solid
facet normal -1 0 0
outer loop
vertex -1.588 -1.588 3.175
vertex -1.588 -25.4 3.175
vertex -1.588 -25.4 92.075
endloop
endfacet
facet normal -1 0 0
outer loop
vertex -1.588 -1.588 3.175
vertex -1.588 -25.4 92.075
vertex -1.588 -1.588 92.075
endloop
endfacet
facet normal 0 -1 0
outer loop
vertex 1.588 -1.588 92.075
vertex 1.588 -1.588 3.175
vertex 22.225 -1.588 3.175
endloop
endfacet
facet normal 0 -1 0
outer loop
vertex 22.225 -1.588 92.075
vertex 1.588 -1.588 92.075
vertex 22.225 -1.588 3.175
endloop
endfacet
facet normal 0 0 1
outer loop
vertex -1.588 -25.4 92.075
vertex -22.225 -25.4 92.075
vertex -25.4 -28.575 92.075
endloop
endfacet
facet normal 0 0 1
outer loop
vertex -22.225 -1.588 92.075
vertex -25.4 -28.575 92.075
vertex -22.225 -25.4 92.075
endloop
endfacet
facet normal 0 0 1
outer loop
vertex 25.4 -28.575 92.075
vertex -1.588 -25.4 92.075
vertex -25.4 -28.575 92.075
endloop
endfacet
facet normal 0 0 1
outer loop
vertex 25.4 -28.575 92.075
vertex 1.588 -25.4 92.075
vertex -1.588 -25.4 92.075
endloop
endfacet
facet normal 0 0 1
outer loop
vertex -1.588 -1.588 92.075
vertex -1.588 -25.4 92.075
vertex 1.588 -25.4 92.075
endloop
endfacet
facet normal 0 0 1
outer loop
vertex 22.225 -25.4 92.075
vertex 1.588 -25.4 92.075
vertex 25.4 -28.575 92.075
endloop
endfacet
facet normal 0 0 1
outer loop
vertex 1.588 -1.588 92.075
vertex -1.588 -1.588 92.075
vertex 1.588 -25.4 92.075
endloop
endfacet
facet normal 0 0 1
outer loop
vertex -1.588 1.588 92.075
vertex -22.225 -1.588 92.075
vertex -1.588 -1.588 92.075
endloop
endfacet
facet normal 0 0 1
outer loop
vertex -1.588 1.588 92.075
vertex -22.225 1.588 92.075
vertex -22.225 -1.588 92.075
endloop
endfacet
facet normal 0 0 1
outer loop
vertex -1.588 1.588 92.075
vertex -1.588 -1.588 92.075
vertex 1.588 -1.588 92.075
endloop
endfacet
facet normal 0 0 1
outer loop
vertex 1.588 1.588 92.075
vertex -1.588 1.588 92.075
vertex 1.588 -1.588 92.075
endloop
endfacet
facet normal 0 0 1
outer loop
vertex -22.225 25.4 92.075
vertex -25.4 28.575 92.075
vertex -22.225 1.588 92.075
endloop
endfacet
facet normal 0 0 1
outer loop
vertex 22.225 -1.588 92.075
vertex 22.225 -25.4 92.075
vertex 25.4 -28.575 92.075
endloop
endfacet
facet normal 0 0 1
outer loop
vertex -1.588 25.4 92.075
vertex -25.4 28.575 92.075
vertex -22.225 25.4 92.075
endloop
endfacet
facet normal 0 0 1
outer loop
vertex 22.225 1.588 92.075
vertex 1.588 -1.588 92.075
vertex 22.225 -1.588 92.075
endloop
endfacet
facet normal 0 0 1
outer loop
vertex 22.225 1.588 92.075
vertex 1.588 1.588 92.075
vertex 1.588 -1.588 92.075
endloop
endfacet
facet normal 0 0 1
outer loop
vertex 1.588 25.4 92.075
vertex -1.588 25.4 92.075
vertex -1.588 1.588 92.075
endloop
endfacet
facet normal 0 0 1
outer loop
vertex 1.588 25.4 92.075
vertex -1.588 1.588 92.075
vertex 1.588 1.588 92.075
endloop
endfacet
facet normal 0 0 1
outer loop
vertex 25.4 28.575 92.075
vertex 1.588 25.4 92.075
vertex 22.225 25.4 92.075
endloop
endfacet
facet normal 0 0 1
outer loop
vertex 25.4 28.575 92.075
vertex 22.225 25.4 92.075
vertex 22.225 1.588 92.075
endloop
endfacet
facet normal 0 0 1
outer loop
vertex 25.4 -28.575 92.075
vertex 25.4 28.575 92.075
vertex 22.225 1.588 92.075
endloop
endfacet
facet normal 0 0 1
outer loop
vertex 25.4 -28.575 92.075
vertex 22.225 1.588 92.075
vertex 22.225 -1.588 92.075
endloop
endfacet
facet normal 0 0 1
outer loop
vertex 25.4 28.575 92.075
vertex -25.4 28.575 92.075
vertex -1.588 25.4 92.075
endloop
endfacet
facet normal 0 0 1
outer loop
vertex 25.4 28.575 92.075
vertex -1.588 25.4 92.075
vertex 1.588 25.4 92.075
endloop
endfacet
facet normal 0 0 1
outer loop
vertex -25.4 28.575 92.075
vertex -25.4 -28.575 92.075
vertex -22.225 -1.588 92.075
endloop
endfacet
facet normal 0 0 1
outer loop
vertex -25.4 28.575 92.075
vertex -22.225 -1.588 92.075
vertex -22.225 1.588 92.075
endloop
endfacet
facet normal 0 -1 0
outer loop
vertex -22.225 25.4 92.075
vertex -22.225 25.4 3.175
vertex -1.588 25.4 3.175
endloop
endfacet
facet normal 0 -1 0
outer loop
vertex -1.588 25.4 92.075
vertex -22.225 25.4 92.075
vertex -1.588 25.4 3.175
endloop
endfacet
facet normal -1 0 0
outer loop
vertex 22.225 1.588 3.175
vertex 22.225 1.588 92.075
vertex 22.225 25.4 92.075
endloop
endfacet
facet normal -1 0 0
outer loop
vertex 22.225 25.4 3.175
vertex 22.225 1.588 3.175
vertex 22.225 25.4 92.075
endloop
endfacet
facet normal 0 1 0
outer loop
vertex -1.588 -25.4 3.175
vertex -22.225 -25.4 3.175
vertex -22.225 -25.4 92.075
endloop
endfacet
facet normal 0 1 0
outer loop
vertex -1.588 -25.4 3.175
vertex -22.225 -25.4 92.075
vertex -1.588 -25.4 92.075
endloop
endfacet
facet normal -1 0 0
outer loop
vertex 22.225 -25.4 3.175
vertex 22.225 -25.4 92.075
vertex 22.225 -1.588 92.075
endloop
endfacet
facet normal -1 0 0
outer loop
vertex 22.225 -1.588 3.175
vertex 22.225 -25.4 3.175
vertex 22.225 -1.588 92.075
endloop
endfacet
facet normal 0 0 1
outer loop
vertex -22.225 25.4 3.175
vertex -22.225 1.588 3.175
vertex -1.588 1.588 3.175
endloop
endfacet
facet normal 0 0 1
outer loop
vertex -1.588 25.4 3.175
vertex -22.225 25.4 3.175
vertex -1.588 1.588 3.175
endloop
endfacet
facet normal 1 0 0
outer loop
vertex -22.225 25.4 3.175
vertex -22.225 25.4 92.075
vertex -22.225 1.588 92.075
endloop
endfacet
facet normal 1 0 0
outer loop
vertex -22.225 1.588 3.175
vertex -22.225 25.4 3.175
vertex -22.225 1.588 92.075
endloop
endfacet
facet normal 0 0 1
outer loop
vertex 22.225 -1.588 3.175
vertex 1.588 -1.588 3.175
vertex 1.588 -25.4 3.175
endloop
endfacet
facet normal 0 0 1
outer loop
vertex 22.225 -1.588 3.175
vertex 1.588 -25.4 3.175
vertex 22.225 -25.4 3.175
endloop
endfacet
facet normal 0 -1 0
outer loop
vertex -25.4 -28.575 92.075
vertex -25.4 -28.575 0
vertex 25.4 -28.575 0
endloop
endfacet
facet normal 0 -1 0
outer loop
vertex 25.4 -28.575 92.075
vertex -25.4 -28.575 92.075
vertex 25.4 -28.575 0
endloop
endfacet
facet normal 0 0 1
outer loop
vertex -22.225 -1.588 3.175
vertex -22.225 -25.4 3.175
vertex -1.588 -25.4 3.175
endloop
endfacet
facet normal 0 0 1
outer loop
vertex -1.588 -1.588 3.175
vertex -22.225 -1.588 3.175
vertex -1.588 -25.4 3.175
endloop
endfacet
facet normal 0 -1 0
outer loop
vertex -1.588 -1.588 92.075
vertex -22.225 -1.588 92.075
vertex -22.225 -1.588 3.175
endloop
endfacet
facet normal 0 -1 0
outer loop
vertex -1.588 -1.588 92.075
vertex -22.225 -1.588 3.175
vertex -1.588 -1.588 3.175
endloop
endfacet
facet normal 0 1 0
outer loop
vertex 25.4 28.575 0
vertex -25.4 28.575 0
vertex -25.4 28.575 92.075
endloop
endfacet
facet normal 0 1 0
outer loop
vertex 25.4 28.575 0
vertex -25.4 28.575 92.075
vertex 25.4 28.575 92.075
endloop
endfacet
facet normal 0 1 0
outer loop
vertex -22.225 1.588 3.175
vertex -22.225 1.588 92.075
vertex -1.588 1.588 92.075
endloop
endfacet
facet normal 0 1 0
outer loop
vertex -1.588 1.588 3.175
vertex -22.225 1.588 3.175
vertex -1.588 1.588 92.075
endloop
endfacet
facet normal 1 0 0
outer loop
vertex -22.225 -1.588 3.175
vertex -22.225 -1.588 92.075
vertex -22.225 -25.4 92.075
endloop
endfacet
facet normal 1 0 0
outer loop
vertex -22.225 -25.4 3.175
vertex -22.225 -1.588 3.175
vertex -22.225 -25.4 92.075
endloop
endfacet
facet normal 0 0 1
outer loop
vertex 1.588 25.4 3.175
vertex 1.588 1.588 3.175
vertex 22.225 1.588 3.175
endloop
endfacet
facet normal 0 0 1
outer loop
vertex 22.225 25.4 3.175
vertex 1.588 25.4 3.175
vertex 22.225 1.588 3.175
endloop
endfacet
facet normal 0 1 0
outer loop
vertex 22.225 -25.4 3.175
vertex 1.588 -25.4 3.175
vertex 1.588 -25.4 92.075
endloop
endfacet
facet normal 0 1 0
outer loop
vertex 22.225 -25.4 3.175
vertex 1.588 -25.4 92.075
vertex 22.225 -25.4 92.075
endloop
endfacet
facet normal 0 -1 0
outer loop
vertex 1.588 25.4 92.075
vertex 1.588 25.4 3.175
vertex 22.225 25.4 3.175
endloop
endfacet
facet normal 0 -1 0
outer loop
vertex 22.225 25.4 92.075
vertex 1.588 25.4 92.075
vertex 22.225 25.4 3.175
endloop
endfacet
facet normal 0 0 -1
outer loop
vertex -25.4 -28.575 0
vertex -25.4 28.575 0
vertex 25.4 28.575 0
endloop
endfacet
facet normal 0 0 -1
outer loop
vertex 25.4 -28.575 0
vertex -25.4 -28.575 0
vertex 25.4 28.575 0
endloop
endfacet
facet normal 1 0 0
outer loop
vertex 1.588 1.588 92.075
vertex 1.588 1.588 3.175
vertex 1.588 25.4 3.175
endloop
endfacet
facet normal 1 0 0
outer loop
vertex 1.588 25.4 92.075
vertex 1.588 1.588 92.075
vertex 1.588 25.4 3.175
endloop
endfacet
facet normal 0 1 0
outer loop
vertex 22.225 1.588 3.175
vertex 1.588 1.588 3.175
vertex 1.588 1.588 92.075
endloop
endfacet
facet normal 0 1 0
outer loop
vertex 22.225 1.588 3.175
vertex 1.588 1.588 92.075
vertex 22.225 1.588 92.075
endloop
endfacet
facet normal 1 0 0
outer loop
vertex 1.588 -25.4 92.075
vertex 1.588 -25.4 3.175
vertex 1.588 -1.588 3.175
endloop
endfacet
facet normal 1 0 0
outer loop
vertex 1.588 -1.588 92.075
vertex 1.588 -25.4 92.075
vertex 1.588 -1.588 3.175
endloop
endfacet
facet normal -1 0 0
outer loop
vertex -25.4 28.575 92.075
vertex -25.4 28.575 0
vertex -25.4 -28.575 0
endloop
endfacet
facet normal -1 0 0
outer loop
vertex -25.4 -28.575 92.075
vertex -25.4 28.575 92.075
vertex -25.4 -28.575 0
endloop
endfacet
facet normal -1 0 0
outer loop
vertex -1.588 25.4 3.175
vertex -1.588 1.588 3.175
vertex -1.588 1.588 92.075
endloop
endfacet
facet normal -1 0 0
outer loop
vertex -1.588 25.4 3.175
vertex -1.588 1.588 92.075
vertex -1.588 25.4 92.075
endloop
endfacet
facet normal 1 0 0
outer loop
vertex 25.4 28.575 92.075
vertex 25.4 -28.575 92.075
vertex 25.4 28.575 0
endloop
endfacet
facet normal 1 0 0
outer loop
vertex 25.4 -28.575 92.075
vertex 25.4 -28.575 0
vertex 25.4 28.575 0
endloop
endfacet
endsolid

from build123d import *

# Parameters (mm, degrees)
F0_W      = 50.8
F0_H      = 57.15
F1_DEPTH  = 3.175
F2_W      = 50.8
F2_H      = 3.175
F3_DEPTH  = 88.9
F4_W      = 50.8
F4_H      = 3.175
F5_DEPTH  = 88.9
F6_W      = 50.8
F6_H      = 88.9
F7_DEPTH  = 3.175
F8_W      = 57.15
F8_H      = 92.075
F9_DEPTH  = 3.175
F11_W     = 44.45
F11_H     = 3.175
F12_DEPTH = 88.9
F10_W     = 3.175
F10_H     = 50.8
F13_DEPTH = 88.9


with BuildPart() as f1:
    # F0 (on Top) → F1 (new body)
    with BuildSketch(Plane.XY):
        Rectangle(F0_W, F0_H)
    extrude(amount=F1_DEPTH)

    # F2 (on face) → F3 (join)
    with BuildSketch(Plane.XY.offset(3.175)):
        with Locations((0, 26.9875)):
            Rectangle(F2_W, F2_H)
    extrude(amount=F3_DEPTH)

    # F4 (on face) → F5 (join)
    with BuildSketch(Plane.XY.offset(3.175)):
        with Locations((0, -26.9875)):
            Rectangle(F4_W, F4_H)
    extrude(amount=F5_DEPTH)

    # F6 (on face) → F7 (join)
    with BuildSketch(Plane(origin=(-25.4, 0, 0), x_dir=(0, -1, 0), z_dir=(-1, 0, 0))):
        with Locations((0, 47.625)):
            Rectangle(F6_W, F6_H)
    extrude(amount=-F7_DEPTH)

    # F8 (on face) → F9 (join)
    with BuildSketch(Plane.YZ.offset(25.4)):
        with Locations((0, 46.0375)):
            Rectangle(F8_W, F8_H)
    extrude(amount=-F9_DEPTH)

    # F11 (on face) → F12 (join)
    with BuildSketch(Plane.XY.offset(3.175)):
        Rectangle(F11_W, F11_H)
    extrude(amount=F12_DEPTH)

    # F10 (on face) → F13 (join)
    with BuildSketch(Plane.XY.offset(3.175)):
        Rectangle(F10_W, F10_H)
    extrude(amount=F13_DEPTH)


solid = f1.part
